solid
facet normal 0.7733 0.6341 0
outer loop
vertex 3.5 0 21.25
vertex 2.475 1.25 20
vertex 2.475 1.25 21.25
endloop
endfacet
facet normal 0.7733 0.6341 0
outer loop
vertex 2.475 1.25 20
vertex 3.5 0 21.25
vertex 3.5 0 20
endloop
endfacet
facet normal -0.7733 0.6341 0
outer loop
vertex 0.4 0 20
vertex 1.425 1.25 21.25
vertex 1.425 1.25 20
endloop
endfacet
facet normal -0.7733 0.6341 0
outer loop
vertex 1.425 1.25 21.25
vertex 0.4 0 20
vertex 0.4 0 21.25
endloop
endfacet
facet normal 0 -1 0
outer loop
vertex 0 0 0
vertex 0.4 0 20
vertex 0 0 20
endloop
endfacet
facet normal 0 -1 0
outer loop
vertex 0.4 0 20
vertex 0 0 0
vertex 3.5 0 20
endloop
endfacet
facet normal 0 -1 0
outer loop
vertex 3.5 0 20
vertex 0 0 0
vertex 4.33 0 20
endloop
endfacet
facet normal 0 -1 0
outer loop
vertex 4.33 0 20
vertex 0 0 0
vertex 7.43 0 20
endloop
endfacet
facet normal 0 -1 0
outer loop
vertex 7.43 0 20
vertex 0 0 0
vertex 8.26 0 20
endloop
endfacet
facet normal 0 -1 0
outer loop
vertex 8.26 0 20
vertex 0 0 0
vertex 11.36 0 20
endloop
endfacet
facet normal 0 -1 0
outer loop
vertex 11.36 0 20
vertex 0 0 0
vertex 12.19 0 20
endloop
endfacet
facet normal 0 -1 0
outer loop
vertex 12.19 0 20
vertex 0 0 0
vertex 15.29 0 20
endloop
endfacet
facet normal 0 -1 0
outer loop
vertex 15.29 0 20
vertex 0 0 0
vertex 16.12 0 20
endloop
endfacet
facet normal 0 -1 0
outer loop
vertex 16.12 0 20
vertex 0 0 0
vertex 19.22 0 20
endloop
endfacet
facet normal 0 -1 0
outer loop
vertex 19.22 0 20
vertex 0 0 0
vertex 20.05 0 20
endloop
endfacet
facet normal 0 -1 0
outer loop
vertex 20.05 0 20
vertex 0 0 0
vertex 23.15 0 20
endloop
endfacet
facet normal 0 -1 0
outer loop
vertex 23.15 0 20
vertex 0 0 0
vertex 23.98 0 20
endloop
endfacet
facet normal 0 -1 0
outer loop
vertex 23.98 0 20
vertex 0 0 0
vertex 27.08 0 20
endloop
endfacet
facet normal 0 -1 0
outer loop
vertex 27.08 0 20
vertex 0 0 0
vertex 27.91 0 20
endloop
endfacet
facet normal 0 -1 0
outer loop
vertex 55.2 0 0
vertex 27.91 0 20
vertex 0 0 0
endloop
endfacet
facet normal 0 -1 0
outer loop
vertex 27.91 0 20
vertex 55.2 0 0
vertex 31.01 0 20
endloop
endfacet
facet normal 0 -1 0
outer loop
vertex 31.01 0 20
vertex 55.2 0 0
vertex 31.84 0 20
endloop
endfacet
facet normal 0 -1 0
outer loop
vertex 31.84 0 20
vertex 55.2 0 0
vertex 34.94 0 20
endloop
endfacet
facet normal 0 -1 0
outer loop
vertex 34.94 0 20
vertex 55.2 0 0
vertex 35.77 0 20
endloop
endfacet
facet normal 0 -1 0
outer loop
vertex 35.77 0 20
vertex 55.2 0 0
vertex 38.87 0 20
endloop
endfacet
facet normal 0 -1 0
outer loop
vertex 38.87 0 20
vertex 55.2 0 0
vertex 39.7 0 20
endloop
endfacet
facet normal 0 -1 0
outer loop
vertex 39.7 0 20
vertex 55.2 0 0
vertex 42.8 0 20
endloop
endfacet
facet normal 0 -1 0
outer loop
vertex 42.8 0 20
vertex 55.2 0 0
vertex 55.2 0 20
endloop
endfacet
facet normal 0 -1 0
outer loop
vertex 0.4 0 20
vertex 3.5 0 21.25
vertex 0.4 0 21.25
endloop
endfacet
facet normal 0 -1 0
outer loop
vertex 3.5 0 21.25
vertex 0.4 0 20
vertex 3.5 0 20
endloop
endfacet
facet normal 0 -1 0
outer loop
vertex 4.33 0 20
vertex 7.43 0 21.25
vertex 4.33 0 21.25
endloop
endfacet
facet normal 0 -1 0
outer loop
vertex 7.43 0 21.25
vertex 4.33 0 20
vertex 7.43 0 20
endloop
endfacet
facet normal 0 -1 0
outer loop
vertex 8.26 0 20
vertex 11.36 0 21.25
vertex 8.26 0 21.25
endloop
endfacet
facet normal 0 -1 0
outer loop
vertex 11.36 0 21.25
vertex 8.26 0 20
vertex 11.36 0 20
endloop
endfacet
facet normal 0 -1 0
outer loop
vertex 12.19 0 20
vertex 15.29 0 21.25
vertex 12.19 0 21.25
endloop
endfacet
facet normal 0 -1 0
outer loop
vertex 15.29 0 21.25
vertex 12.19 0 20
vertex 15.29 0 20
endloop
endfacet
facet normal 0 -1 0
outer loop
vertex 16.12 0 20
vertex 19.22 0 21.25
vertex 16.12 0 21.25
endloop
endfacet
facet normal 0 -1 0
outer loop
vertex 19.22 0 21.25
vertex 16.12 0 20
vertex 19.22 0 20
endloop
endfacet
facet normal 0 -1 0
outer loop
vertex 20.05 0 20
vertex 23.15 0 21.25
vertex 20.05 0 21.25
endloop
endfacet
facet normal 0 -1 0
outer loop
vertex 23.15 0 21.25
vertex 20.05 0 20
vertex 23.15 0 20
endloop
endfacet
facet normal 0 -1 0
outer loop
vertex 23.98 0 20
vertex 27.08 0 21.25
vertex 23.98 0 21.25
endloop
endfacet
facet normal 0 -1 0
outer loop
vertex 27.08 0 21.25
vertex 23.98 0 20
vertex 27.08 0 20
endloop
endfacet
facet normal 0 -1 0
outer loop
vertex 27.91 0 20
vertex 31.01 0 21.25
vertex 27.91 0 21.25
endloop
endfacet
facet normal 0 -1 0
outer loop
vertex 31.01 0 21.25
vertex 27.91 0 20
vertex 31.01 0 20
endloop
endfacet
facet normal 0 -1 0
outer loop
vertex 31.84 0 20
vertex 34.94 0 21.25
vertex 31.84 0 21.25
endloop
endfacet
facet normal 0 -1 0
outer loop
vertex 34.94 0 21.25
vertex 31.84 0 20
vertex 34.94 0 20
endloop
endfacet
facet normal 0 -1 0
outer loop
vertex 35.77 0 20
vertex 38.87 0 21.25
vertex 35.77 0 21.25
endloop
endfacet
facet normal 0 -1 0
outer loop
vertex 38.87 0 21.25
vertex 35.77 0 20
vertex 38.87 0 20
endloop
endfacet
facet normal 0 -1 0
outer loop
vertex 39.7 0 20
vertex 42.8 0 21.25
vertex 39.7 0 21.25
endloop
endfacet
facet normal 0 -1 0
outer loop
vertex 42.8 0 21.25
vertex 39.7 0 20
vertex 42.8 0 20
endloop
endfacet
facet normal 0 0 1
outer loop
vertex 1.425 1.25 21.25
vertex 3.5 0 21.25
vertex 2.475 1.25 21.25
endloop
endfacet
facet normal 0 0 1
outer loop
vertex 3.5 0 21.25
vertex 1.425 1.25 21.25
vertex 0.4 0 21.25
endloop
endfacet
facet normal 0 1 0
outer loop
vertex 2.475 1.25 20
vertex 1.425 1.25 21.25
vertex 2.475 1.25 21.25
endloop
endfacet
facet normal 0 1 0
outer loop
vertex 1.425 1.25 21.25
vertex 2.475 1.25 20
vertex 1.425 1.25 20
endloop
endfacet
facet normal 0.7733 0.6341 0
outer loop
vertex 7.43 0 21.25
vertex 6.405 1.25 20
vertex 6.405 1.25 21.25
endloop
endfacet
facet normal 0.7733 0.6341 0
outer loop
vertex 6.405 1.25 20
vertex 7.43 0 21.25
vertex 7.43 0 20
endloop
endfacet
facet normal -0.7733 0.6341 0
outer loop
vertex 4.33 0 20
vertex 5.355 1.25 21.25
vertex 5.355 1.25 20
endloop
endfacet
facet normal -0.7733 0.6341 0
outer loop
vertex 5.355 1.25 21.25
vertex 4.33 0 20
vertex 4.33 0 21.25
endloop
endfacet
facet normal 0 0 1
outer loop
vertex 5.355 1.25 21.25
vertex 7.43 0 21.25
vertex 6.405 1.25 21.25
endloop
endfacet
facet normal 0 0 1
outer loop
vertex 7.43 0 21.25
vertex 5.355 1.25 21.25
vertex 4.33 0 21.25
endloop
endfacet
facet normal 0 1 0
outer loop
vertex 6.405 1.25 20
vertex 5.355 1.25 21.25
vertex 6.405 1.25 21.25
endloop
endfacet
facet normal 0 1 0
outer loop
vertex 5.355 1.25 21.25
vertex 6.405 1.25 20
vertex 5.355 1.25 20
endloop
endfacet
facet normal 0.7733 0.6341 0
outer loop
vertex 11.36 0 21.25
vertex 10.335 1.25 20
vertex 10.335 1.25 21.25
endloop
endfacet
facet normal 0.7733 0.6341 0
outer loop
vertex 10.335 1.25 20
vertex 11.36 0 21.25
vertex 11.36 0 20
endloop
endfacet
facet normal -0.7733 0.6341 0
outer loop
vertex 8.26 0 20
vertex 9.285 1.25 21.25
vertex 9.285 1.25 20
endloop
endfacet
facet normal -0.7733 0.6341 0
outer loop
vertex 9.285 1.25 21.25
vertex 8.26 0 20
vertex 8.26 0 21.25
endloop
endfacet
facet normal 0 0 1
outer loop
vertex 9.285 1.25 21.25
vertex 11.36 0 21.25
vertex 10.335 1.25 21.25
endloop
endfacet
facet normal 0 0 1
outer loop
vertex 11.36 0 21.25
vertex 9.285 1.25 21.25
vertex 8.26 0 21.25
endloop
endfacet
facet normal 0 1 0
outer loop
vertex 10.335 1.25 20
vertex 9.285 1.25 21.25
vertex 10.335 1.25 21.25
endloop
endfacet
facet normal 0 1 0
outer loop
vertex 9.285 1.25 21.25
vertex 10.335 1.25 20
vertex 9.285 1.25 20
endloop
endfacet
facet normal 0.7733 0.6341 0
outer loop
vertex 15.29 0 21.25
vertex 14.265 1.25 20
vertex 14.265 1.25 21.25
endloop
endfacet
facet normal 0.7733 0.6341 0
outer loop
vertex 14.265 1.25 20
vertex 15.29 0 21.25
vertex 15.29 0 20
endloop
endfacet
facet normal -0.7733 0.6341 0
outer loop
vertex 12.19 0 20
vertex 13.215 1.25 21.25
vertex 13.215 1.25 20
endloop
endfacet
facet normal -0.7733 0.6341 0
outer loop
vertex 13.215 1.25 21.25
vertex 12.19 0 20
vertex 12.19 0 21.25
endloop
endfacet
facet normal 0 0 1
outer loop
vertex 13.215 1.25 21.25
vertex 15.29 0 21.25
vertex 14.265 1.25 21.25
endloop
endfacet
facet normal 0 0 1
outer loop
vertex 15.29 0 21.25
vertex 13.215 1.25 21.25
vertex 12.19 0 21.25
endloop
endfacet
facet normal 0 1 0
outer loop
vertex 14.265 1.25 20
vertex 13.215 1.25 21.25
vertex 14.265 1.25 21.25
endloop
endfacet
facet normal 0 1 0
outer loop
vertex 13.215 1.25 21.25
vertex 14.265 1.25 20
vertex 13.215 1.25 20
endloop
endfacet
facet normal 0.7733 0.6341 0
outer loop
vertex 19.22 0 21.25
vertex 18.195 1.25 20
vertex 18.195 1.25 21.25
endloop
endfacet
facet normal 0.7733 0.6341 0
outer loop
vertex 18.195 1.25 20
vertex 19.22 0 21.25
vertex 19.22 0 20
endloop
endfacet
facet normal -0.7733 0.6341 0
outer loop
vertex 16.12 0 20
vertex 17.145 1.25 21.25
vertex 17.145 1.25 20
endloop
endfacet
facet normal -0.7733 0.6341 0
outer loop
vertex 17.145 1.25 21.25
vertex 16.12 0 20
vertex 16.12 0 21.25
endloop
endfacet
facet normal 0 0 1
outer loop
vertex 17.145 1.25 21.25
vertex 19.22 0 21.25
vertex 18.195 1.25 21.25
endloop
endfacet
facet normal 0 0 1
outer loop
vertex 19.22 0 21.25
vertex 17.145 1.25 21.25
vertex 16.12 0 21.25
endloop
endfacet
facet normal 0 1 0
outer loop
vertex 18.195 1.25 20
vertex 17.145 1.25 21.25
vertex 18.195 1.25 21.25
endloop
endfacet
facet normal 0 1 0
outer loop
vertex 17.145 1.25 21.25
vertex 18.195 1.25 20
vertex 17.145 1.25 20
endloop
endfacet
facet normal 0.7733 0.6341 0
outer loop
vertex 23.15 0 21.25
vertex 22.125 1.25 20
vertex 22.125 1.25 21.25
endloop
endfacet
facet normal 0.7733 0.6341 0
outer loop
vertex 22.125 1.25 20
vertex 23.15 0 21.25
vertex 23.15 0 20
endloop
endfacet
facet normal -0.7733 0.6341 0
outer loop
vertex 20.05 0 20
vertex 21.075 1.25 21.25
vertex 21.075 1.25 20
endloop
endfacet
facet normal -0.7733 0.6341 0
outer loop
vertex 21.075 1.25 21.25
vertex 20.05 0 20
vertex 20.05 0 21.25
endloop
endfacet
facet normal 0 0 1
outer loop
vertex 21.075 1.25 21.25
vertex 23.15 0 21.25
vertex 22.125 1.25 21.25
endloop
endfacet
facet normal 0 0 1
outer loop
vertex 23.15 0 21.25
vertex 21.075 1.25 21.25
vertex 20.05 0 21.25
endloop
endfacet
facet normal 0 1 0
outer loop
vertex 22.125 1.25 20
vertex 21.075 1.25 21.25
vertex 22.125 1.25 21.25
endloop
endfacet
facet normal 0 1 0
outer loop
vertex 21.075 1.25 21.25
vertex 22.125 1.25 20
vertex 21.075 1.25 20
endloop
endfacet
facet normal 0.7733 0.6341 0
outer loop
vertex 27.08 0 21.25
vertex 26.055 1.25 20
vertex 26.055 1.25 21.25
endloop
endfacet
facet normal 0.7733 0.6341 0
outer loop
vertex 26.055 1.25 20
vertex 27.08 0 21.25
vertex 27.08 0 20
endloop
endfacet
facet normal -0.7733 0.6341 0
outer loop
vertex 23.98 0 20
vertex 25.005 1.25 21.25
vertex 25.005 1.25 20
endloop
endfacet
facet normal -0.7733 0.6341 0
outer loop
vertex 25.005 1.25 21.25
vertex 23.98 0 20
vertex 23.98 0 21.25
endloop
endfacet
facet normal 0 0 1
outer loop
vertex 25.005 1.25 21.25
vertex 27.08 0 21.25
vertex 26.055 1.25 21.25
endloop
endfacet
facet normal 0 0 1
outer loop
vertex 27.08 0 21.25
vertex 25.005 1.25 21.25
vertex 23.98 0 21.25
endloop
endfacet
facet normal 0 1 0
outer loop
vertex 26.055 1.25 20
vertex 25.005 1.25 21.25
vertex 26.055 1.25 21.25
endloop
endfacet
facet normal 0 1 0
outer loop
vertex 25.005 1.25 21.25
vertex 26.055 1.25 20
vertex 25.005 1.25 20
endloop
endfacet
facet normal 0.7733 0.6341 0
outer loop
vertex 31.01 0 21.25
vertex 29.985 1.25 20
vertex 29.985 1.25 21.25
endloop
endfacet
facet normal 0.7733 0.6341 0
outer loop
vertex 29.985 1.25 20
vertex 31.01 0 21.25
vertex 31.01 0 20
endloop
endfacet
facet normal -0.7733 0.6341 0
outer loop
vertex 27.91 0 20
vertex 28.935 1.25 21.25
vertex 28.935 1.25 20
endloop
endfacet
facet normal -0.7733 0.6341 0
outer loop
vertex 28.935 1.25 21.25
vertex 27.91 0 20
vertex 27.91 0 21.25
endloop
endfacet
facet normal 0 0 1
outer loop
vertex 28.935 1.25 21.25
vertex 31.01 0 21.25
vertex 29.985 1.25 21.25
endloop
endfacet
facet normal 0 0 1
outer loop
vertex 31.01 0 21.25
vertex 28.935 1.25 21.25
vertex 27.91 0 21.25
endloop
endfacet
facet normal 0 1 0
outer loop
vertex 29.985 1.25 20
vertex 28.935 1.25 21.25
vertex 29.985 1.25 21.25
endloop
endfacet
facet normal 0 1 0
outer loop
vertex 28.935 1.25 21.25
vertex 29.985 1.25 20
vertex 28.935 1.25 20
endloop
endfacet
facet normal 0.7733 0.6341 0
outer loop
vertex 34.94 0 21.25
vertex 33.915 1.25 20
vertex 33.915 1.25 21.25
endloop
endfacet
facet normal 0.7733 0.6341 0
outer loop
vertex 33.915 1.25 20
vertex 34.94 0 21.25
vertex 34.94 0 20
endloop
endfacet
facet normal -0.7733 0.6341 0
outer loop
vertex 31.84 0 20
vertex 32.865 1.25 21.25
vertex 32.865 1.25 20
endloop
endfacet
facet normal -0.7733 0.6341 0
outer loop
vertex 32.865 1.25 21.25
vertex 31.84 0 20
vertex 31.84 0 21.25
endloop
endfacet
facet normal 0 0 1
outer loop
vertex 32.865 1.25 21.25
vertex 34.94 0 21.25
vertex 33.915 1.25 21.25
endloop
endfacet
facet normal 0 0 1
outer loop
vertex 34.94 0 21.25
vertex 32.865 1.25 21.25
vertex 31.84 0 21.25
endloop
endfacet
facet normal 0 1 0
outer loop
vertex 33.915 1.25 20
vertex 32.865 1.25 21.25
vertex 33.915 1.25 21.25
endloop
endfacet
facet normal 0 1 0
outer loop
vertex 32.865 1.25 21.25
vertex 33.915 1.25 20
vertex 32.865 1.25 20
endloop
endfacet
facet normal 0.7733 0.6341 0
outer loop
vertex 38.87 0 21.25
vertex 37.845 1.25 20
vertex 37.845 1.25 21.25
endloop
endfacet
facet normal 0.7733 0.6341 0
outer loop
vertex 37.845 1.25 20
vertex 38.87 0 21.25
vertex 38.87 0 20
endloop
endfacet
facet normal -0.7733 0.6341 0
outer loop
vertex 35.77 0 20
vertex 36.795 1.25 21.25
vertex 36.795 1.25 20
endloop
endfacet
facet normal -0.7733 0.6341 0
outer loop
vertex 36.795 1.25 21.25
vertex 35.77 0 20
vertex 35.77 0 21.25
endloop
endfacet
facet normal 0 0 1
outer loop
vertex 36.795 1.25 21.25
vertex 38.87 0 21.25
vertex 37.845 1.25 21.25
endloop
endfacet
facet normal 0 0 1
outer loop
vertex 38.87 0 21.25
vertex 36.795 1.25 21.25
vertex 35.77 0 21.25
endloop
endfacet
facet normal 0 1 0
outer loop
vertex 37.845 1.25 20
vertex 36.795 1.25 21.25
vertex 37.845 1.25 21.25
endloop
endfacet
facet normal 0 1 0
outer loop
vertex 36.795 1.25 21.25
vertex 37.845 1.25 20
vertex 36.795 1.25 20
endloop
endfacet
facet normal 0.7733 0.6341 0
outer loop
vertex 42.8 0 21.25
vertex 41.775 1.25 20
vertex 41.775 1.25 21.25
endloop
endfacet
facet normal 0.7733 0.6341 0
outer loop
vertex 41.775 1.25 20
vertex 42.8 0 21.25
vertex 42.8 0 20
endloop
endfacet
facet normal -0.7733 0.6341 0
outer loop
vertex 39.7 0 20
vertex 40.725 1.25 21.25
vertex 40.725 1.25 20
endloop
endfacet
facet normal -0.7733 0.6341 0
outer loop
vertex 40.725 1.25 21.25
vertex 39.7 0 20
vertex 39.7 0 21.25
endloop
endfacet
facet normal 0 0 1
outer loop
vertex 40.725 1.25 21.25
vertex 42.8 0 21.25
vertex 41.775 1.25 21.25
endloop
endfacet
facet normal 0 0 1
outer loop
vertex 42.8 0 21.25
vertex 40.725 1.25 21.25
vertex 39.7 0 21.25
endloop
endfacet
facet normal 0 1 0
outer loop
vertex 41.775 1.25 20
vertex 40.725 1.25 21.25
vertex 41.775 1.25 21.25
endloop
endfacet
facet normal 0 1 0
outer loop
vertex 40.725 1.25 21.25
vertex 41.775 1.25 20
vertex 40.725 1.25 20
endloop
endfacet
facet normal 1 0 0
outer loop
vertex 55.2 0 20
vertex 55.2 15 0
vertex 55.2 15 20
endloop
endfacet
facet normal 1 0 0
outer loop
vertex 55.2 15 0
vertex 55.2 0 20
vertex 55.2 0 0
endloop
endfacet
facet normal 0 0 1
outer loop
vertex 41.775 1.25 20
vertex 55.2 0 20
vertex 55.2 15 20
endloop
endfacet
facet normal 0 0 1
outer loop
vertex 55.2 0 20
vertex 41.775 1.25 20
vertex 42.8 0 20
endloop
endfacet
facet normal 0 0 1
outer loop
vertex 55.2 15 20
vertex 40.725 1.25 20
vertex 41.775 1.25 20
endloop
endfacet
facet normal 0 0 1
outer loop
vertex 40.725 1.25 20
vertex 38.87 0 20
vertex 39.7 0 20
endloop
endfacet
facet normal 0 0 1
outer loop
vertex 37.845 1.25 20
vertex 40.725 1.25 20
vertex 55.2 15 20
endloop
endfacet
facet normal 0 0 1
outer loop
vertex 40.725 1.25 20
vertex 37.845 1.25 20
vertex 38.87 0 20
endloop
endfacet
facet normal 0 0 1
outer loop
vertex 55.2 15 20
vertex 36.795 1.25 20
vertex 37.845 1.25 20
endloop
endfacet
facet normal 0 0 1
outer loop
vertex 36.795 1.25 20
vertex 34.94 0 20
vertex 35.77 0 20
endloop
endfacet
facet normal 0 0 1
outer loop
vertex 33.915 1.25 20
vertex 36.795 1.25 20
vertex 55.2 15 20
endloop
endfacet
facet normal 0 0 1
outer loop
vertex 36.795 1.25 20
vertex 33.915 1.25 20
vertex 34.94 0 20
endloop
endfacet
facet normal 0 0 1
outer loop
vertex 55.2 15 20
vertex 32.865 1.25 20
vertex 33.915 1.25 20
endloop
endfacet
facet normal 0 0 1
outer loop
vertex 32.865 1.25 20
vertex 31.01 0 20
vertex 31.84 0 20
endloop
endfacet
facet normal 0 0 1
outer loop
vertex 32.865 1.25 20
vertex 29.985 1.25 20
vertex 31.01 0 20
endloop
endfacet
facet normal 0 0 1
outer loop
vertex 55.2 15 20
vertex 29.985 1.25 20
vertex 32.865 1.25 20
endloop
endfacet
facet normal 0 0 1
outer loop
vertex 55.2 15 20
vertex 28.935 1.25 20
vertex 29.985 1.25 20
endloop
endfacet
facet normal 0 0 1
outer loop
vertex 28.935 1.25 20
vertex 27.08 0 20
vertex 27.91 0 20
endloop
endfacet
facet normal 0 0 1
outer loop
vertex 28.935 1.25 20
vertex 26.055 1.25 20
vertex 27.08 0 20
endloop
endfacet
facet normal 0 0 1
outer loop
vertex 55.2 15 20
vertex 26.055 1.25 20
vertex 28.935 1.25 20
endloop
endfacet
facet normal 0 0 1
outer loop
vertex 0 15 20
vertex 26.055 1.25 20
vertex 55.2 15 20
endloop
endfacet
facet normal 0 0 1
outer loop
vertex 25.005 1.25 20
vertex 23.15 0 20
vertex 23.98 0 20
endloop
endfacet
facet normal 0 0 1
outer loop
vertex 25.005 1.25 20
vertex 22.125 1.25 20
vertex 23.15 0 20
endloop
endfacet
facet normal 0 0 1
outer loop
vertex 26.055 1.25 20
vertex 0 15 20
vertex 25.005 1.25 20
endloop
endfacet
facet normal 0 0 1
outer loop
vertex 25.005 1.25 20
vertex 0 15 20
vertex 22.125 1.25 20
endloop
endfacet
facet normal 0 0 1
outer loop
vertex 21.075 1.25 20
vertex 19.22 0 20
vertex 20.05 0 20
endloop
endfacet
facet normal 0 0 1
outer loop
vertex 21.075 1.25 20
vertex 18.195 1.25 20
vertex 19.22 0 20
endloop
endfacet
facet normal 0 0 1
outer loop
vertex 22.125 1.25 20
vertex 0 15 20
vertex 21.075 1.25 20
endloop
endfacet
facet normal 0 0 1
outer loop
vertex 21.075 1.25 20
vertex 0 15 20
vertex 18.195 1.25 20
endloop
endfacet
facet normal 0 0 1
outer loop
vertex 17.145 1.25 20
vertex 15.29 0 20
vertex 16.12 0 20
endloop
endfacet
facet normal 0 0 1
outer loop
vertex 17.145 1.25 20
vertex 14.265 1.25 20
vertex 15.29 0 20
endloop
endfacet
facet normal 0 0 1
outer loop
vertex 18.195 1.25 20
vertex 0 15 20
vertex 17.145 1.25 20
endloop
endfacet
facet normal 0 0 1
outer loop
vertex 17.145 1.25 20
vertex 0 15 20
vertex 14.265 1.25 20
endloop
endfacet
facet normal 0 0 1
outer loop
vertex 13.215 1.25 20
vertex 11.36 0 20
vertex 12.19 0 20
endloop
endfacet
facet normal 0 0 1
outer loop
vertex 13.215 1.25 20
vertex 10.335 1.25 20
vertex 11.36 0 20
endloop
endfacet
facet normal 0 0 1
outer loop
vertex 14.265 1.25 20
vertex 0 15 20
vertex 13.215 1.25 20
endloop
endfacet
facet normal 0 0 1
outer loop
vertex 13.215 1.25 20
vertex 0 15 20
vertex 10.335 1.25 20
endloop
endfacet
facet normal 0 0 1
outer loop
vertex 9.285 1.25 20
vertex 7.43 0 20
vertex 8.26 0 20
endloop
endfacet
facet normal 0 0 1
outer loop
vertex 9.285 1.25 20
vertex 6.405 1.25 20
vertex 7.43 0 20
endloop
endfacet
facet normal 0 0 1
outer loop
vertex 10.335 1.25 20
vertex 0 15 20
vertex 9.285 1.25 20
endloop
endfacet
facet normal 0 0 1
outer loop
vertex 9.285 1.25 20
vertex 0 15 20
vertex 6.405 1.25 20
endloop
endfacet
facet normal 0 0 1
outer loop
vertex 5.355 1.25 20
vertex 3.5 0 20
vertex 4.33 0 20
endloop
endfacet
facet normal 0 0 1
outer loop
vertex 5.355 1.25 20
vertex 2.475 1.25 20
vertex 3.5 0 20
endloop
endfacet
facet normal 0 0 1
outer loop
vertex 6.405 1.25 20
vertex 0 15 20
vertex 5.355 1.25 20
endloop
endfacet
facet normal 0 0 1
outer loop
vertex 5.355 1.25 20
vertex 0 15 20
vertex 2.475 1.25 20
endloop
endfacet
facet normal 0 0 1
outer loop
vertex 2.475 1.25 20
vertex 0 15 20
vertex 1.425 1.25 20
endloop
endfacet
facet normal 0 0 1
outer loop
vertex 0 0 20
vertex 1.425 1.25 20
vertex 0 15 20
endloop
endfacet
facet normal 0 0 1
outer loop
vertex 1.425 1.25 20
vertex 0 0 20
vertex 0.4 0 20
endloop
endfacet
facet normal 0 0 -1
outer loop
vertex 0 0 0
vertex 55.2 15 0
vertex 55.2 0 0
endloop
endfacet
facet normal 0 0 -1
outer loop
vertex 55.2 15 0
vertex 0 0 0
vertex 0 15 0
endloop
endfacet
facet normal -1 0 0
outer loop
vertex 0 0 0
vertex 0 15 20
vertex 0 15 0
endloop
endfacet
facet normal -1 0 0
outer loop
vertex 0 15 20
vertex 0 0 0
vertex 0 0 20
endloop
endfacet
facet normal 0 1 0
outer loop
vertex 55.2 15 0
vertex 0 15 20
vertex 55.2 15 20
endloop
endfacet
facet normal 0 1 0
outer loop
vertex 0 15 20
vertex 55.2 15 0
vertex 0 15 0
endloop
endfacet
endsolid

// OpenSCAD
$fn = 32;

// ----------------------------------------------------------------------
// Gear rack: m=1.25 z=11, 55.2 x 15 x 21.25 mm
// ----------------------------------------------------------------------

// --- parameters (mm) ---
length = 55.2;            // rack length, X
width = 15;               // rack width, Y
height = 21.25;           // overall height, Z
module_m = 1.25;          // module
back_t = 20;              // tooth root line height
pitch = 3.93;             // circular pitch
tip_w = 1.05;             // tooth thickness at the tip
root_w = 3.1;             // tooth thickness at the root line
sink = 0.6;               // tooth root overlap into the body

tooth_span = 43.2;

module tooth(x0) {
  /* 20 deg flank profile, sunk into the body for a positive overlap */
  translate([x0, 0, back_t - sink])
    linear_extrude(height = height - back_t + sink)
      polygon(points = [[-root_w / 2, 0], [root_w / 2, 0],
                        [tip_w / 2, height - back_t],
                        [-tip_w / 2, height - back_t]]);
}

difference() {
  union() {
    cube([length, width, back_t]);
    for (i = [0 : 11 - 1])
      tooth((i + 0.5) * pitch + (tooth_span - 11 * pitch) / 2);
  }
}
